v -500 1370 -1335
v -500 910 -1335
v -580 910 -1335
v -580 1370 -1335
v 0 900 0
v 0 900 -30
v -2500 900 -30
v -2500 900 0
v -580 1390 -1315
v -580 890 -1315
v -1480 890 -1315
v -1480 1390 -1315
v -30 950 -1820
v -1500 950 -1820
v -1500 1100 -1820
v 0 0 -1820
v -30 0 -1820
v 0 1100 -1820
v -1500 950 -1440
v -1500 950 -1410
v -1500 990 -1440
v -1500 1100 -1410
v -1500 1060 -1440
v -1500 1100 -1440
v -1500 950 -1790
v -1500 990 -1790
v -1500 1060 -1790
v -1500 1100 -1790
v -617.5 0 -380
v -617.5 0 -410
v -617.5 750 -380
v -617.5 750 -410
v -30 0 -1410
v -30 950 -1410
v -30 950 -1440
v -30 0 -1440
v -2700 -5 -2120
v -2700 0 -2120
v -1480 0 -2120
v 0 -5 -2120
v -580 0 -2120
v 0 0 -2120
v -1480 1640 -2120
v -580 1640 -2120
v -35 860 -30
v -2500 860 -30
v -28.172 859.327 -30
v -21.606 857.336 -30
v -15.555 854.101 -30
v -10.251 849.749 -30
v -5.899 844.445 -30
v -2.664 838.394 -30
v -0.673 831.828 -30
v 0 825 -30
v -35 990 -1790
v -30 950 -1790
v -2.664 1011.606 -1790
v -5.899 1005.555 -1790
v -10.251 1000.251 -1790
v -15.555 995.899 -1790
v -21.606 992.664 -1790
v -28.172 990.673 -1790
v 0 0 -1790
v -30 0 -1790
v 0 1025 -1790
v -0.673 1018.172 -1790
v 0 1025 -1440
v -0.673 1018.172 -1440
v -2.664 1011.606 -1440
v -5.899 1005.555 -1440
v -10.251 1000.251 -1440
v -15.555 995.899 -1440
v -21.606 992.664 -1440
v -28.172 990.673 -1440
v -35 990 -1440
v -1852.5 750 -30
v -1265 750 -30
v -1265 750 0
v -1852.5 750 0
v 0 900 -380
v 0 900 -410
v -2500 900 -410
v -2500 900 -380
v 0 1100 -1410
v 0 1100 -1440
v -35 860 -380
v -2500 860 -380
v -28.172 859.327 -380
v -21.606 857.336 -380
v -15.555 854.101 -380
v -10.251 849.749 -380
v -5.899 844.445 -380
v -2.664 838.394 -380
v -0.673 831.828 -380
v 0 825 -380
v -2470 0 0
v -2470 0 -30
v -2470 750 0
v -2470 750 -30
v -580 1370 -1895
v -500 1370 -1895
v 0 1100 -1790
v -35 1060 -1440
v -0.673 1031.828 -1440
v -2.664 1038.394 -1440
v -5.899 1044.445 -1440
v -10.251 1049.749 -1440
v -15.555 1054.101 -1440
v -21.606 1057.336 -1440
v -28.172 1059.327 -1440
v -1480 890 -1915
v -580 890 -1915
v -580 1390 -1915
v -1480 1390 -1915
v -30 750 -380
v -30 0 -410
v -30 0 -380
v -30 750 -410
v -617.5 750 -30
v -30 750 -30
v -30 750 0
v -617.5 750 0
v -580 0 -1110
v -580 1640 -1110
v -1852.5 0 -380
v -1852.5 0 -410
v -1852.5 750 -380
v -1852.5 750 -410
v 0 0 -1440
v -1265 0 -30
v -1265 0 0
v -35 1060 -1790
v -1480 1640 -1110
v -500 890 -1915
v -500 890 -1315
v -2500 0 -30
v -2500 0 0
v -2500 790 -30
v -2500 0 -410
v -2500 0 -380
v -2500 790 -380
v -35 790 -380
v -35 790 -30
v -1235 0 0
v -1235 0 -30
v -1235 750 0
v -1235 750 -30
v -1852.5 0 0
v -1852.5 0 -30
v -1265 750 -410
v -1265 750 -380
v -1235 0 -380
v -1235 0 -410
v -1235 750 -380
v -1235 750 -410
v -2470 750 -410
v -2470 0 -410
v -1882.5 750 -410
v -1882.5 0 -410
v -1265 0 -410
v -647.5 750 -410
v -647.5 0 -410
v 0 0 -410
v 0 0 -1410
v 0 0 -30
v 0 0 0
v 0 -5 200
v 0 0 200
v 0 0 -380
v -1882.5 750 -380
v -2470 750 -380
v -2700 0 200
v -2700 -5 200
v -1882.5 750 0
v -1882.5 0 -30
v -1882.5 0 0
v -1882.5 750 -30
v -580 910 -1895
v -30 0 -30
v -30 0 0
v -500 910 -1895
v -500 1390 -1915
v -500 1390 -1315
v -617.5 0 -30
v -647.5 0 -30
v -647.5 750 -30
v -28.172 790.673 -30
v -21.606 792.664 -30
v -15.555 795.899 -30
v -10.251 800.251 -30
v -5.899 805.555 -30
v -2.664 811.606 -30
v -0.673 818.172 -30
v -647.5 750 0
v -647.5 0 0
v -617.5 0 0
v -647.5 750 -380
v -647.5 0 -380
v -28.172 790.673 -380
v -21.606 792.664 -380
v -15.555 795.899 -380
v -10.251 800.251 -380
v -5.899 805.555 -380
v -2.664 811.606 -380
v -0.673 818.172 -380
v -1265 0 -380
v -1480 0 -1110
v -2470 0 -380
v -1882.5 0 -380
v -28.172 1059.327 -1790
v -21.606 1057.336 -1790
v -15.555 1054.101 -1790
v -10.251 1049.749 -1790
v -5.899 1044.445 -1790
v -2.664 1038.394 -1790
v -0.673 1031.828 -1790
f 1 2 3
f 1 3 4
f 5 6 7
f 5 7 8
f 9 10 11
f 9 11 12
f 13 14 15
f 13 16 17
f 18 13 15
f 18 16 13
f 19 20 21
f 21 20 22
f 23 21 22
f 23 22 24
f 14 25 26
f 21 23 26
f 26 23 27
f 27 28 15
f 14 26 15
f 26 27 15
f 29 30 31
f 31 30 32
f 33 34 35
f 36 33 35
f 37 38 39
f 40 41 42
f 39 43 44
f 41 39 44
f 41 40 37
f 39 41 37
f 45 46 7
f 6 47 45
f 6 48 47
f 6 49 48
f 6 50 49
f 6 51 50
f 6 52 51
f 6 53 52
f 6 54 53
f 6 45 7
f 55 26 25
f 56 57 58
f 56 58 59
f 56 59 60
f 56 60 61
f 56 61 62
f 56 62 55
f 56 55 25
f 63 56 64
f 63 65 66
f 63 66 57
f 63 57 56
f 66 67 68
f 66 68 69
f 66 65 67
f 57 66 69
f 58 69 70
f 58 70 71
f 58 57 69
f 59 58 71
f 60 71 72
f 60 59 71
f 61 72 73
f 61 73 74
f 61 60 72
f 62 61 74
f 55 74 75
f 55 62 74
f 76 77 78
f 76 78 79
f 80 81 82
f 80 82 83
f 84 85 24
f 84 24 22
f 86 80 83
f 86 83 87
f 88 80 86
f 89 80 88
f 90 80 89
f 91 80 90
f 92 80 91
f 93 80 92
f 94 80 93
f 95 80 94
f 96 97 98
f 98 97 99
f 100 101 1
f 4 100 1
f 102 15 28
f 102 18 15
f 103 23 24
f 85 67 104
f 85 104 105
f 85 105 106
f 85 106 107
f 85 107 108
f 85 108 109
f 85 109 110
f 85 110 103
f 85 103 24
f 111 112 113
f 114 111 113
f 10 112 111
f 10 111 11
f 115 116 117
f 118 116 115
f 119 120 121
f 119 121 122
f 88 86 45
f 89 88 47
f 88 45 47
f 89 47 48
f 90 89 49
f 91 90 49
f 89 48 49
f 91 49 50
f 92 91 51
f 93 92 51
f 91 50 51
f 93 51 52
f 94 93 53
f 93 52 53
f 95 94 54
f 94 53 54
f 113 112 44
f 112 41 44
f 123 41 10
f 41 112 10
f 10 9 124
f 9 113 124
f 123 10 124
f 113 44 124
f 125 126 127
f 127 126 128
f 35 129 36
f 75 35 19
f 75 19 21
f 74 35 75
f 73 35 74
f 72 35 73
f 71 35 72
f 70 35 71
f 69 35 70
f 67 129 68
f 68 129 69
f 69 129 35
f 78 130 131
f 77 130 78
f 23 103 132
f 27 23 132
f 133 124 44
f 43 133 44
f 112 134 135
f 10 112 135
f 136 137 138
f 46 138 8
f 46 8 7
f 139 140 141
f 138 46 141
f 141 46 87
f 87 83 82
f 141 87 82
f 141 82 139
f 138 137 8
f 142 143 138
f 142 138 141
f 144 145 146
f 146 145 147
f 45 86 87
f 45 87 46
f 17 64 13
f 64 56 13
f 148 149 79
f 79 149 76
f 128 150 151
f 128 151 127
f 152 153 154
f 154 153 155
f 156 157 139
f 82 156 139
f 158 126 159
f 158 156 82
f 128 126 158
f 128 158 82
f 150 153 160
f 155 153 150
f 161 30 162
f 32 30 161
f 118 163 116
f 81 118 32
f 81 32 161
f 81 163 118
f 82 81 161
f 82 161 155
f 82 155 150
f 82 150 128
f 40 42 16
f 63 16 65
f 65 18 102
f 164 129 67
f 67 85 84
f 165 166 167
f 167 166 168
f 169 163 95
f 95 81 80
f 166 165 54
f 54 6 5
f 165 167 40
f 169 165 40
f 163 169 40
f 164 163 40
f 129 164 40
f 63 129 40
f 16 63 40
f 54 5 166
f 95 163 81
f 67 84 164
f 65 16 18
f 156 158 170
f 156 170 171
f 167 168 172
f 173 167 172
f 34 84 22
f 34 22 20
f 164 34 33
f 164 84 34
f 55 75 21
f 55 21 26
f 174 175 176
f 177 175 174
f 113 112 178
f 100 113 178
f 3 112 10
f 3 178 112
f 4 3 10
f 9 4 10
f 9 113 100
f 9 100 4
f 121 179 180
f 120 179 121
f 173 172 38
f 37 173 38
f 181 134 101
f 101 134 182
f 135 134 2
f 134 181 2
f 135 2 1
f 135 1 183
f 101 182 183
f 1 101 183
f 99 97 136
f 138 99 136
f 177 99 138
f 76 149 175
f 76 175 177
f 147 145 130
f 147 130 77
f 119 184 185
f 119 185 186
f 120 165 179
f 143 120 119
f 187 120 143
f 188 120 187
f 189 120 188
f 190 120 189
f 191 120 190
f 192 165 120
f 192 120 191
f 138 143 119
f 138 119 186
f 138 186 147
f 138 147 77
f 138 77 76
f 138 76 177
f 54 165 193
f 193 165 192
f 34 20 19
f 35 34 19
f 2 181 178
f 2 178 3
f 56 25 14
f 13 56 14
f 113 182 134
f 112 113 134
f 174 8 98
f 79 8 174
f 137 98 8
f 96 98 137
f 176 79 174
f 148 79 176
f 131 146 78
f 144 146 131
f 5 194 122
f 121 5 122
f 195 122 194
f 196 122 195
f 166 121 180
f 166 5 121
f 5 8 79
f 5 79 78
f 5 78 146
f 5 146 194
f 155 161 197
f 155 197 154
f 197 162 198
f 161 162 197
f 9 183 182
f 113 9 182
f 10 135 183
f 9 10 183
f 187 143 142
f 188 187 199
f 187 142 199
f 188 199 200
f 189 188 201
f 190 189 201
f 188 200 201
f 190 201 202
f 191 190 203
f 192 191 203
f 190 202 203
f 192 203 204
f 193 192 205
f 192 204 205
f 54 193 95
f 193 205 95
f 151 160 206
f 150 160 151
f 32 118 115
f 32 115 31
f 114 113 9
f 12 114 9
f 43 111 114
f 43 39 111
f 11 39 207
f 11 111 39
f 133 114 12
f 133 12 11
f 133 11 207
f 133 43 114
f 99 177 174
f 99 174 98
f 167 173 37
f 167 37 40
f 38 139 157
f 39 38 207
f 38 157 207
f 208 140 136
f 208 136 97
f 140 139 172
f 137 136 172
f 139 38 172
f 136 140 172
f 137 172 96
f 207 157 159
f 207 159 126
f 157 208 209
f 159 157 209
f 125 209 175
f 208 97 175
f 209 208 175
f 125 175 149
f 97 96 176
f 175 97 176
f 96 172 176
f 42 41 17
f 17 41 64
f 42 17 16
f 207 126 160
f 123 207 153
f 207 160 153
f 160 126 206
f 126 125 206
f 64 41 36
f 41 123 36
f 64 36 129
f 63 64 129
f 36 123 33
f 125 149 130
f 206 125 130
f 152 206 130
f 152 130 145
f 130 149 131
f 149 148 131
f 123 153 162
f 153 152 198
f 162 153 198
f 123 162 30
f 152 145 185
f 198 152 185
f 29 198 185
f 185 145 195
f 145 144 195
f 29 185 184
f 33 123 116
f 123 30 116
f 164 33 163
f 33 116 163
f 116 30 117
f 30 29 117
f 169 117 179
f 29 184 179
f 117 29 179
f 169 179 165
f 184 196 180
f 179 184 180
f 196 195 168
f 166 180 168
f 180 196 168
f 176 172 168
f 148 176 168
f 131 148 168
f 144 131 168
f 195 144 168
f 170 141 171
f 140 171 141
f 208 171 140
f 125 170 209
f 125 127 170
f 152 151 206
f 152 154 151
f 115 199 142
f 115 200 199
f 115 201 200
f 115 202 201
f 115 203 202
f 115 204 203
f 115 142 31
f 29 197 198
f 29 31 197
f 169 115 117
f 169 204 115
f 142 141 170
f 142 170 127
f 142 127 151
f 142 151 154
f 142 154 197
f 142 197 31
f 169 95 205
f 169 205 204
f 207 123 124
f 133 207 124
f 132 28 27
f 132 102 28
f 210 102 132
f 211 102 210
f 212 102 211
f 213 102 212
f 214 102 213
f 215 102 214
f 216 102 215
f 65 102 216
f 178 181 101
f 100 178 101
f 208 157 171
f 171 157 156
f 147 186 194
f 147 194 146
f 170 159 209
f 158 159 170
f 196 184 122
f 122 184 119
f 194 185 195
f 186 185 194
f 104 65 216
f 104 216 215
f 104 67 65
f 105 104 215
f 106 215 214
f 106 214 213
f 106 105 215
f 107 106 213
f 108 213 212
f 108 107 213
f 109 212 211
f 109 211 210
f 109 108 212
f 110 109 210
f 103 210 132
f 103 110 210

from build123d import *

# Parameters (mm, degrees)
SKETCH1_W             = 30
SKETCH1_H             = 550
SKETCH1_H_2           = 400
SKETCH1_H_3           = 150
SKETCH1_H_4           = 800
BOSS_EXTRUDE5_DEPTH   = 30
BOSS_EXTRUDE6_DEPTH   = 500
BOSS_EXTRUDE7_DEPTH   = 2500
SKETCH2_W             = 560
SKETCH2_H             = 460
BOSS_EXTRUDE8_DEPTH   = 80
BOSS_EXTRUDE10_DEPTH  = 900
SKETCH6_4_OUTSIDE_W   = 2855.048
SKETCH6_4_OUTSIDE_H   = 2375.048
SKETCH6_4_OUTSIDE_W_2 = 600
SKETCH6_4_OUTSIDE_H_2 = 500
CUT_EXTRUDE2_DEPTH    = 3298.028965599
FILLET1_R             = 35
FILLET2_R             = 35
BOSS_EXTRUDE11_DEPTH  = 1000
SKETCH19_W            = 587.5
SKETCH19_H            = 750
CUT_EXTRUDE3_DEPTH    = 2000
SKETCH20_W            = 900
SKETCH20_H            = 1010
BOSS_EXTRUDE12_DEPTH  = 5


with BuildPart() as part:
    # Sketch1 → Boss-Extrude5 (new body)
    with BuildSketch(Plane(origin=(0, 0, 0), x_dir=(0, 0, -1), z_dir=(1, 0, 0))):
        with Locations((1805, 275)):
            Rectangle(SKETCH1_W, SKETCH1_H)
        with Locations((1805, 750)):
            Rectangle(SKETCH1_W, SKETCH1_H_2)
        with Locations((1425, 875)):
            Rectangle(SKETCH1_W, SKETCH1_H_3)
        with Locations((1425, 400)):
            Rectangle(SKETCH1_W, SKETCH1_H_4)
    extrude(amount=-BOSS_EXTRUDE5_DEPTH)

    # Sketch1<10> → Boss-Extrude6 (add)
    with BuildSketch(Plane(origin=(0, 0, 0), x_dir=(0, 0, -1), z_dir=(1, 0, 0))):
        Polygon((1410, 950), (1440, 950), (1440, 990), (1440, 1060), (1440, 1100), (1410, 1100), align=None)
        Polygon((1440, 1060), (1440, 990), (1615, 990), (1790, 990), (1790, 1060), (1615, 1060), align=None)
        Polygon((1790, 990), (1790, 950), (1820, 950), (1820, 1100), (1790, 1100), (1790, 1060), align=None)
    extrude(amount=-BOSS_EXTRUDE6_DEPTH)

    # Fillet1
    fillet1_edges = [part.edges().sort_by_distance(p)[0] for p in [
        (0, 1060, -1615),
        (0, 990, -1615),
    ]]
    fillet(fillet1_edges, radius=FILLET1_R - 0.0001)  # a hair under: the kernel refuses the full size

    # Sketch17 → Boss-Extrude11 (add)
    with BuildSketch(Plane.ZY.offset(500)):
        Polygon((-1615, 1060), (-1440, 1060), (-1440, 1100), (-1410, 1100), (-1410, 950), (-1440, 950), (-1440, 990), (-1790, 990), (-1790, 950), (-1820, 950), (-1820, 1100), (-1790, 1100), (-1790, 1060), align=None)
    extrude(amount=BOSS_EXTRUDE11_DEPTH)



with BuildPart() as body_2:
    # Sketch1<11> → Boss-Extrude7 (new body)
    with BuildSketch(Plane(origin=(0, 0, 0), x_dir=(0, 0, -1), z_dir=(1, 0, 0))):
        Polygon((380, 0), (410, 0), (410, 750), (380, 750), (380, 375), align=None)
        Polygon((0, 0), (30, 0), (30, 450), (30, 750), (0, 750), align=None)
        Polygon((30, 860), (30, 900), (0, 900), (0, 750), (30, 750), (30, 790), align=None)
        Polygon((205, 790), (380, 790), (380, 860), (205, 860), (30, 860), (30, 790), align=None)
        Polygon((380, 750), (410, 750), (410, 900), (380, 900), (380, 860), (380, 790), align=None)
    extrude(amount=-BOSS_EXTRUDE7_DEPTH)

    # Fillet2
    fillet2_edges = [body_2.edges().sort_by_distance(p)[0] for p in [
        (0, 790, -205),
        (0, 860, -205),
    ]]
    fillet(fillet2_edges, radius=FILLET2_R - 0.0001)  # a hair under: the kernel refuses the full size

    # Sketch19 → Cut-Extrude3 (cut)
    with BuildSketch(Plane(origin=(0, 0, -410), x_dir=(-1, 0, 0), z_dir=(0, 0, -1))):
        with Locations((323.75, 375)):
            Rectangle(SKETCH19_W, SKETCH19_H)
        with Locations((941.25, 375)):
            Rectangle(SKETCH19_W, SKETCH19_H)
        with Locations((1558.75, 375)):
            Rectangle(SKETCH19_W, SKETCH19_H)
        with Locations((2176.25, 375)):
            Rectangle(SKETCH19_W, SKETCH19_H)
    extrude(amount=-CUT_EXTRUDE3_DEPTH, mode=Mode.SUBTRACT)


with BuildPart() as body_3:
    # Sketch2 → Boss-Extrude8 (new body)
    with BuildSketch(Plane.ZY.offset(500)):
        Polygon((-1615, 890), (-1315, 890), (-1315, 1390), (-1915, 1390), (-1915, 890), align=None)
        with Locations((-1615, 1140)):
            Rectangle(SKETCH2_W, SKETCH2_H, mode=Mode.SUBTRACT)
    extrude(amount=BOSS_EXTRUDE8_DEPTH)

    # Sketch6 → Boss-Extrude10 (add)
    with BuildSketch(Plane.ZY.offset(580)):
        Polygon((-1110, 1140), (-1110, 1640), (-2120, 1640), (-2120, 0), (-1110, 0), align=None)
    extrude(amount=BOSS_EXTRUDE10_DEPTH)

    # Sketch6<4> outside → Cut-Extrude2 (cut, through all)
    # profile 1 of 2: a face of its own
    with BuildSketch(Plane.ZY.offset(580)):
        with Locations((-1060, 820)):
            Rectangle(SKETCH6_4_OUTSIDE_W, SKETCH6_4_OUTSIDE_H)
        Polygon((-1110, 1140), (-1110, 1640), (-2120, 1640), (-2120, 0), (-1110, 0), align=None, mode=Mode.SUBTRACT)
    # profile 2 of 2: a face of its own
    with BuildSketch(Plane.ZY.offset(580)):
        with Locations((-1615, 1140)):
            Rectangle(SKETCH6_4_OUTSIDE_W_2, SKETCH6_4_OUTSIDE_H_2)
    extrude(amount=CUT_EXTRUDE2_DEPTH, mode=Mode.SUBTRACT)


with BuildPart() as cut_extrude2_piece_1:
    # of the separate pieces the step leaves, piece 1, a body of its own (cut_extrude2_pieces)
    add(body_3.part.solids().sort_by_distance((-580, 1640, -1110))[0])


with BuildPart() as cut_extrude2_piece_2:
    # of the separate pieces the step leaves, piece 2, a body of its own (cut_extrude2_pieces)
    add(body_3.part.solids().sort_by_distance((-500, 890, -1315))[0])


with BuildPart() as part_1:
    add(part.part)

    add(body_2.part)  # Boss-Extrude12 merges body 2

    add(cut_extrude2_piece_1.part)  # Boss-Extrude12 merges Cut-Extrude2 piece 1
    # Sketch20 → Boss-Extrude12 (add)
    with BuildSketch(Plane.XZ):
        Polygon((0, -1820), (0, 0), (0, 200), (-2700, 200), (-2700, -2120), (-1480, -2120), (-1480, -1110), (-580, -1110), (-580, -2120), (0, -2120), align=None)
        with Locations((-1030, -1615)):
            Rectangle(SKETCH20_W, SKETCH20_H)
    extrude(amount=BOSS_EXTRUDE12_DEPTH)


solid = Compound([cut_extrude2_piece_2.part, part_1.part])
